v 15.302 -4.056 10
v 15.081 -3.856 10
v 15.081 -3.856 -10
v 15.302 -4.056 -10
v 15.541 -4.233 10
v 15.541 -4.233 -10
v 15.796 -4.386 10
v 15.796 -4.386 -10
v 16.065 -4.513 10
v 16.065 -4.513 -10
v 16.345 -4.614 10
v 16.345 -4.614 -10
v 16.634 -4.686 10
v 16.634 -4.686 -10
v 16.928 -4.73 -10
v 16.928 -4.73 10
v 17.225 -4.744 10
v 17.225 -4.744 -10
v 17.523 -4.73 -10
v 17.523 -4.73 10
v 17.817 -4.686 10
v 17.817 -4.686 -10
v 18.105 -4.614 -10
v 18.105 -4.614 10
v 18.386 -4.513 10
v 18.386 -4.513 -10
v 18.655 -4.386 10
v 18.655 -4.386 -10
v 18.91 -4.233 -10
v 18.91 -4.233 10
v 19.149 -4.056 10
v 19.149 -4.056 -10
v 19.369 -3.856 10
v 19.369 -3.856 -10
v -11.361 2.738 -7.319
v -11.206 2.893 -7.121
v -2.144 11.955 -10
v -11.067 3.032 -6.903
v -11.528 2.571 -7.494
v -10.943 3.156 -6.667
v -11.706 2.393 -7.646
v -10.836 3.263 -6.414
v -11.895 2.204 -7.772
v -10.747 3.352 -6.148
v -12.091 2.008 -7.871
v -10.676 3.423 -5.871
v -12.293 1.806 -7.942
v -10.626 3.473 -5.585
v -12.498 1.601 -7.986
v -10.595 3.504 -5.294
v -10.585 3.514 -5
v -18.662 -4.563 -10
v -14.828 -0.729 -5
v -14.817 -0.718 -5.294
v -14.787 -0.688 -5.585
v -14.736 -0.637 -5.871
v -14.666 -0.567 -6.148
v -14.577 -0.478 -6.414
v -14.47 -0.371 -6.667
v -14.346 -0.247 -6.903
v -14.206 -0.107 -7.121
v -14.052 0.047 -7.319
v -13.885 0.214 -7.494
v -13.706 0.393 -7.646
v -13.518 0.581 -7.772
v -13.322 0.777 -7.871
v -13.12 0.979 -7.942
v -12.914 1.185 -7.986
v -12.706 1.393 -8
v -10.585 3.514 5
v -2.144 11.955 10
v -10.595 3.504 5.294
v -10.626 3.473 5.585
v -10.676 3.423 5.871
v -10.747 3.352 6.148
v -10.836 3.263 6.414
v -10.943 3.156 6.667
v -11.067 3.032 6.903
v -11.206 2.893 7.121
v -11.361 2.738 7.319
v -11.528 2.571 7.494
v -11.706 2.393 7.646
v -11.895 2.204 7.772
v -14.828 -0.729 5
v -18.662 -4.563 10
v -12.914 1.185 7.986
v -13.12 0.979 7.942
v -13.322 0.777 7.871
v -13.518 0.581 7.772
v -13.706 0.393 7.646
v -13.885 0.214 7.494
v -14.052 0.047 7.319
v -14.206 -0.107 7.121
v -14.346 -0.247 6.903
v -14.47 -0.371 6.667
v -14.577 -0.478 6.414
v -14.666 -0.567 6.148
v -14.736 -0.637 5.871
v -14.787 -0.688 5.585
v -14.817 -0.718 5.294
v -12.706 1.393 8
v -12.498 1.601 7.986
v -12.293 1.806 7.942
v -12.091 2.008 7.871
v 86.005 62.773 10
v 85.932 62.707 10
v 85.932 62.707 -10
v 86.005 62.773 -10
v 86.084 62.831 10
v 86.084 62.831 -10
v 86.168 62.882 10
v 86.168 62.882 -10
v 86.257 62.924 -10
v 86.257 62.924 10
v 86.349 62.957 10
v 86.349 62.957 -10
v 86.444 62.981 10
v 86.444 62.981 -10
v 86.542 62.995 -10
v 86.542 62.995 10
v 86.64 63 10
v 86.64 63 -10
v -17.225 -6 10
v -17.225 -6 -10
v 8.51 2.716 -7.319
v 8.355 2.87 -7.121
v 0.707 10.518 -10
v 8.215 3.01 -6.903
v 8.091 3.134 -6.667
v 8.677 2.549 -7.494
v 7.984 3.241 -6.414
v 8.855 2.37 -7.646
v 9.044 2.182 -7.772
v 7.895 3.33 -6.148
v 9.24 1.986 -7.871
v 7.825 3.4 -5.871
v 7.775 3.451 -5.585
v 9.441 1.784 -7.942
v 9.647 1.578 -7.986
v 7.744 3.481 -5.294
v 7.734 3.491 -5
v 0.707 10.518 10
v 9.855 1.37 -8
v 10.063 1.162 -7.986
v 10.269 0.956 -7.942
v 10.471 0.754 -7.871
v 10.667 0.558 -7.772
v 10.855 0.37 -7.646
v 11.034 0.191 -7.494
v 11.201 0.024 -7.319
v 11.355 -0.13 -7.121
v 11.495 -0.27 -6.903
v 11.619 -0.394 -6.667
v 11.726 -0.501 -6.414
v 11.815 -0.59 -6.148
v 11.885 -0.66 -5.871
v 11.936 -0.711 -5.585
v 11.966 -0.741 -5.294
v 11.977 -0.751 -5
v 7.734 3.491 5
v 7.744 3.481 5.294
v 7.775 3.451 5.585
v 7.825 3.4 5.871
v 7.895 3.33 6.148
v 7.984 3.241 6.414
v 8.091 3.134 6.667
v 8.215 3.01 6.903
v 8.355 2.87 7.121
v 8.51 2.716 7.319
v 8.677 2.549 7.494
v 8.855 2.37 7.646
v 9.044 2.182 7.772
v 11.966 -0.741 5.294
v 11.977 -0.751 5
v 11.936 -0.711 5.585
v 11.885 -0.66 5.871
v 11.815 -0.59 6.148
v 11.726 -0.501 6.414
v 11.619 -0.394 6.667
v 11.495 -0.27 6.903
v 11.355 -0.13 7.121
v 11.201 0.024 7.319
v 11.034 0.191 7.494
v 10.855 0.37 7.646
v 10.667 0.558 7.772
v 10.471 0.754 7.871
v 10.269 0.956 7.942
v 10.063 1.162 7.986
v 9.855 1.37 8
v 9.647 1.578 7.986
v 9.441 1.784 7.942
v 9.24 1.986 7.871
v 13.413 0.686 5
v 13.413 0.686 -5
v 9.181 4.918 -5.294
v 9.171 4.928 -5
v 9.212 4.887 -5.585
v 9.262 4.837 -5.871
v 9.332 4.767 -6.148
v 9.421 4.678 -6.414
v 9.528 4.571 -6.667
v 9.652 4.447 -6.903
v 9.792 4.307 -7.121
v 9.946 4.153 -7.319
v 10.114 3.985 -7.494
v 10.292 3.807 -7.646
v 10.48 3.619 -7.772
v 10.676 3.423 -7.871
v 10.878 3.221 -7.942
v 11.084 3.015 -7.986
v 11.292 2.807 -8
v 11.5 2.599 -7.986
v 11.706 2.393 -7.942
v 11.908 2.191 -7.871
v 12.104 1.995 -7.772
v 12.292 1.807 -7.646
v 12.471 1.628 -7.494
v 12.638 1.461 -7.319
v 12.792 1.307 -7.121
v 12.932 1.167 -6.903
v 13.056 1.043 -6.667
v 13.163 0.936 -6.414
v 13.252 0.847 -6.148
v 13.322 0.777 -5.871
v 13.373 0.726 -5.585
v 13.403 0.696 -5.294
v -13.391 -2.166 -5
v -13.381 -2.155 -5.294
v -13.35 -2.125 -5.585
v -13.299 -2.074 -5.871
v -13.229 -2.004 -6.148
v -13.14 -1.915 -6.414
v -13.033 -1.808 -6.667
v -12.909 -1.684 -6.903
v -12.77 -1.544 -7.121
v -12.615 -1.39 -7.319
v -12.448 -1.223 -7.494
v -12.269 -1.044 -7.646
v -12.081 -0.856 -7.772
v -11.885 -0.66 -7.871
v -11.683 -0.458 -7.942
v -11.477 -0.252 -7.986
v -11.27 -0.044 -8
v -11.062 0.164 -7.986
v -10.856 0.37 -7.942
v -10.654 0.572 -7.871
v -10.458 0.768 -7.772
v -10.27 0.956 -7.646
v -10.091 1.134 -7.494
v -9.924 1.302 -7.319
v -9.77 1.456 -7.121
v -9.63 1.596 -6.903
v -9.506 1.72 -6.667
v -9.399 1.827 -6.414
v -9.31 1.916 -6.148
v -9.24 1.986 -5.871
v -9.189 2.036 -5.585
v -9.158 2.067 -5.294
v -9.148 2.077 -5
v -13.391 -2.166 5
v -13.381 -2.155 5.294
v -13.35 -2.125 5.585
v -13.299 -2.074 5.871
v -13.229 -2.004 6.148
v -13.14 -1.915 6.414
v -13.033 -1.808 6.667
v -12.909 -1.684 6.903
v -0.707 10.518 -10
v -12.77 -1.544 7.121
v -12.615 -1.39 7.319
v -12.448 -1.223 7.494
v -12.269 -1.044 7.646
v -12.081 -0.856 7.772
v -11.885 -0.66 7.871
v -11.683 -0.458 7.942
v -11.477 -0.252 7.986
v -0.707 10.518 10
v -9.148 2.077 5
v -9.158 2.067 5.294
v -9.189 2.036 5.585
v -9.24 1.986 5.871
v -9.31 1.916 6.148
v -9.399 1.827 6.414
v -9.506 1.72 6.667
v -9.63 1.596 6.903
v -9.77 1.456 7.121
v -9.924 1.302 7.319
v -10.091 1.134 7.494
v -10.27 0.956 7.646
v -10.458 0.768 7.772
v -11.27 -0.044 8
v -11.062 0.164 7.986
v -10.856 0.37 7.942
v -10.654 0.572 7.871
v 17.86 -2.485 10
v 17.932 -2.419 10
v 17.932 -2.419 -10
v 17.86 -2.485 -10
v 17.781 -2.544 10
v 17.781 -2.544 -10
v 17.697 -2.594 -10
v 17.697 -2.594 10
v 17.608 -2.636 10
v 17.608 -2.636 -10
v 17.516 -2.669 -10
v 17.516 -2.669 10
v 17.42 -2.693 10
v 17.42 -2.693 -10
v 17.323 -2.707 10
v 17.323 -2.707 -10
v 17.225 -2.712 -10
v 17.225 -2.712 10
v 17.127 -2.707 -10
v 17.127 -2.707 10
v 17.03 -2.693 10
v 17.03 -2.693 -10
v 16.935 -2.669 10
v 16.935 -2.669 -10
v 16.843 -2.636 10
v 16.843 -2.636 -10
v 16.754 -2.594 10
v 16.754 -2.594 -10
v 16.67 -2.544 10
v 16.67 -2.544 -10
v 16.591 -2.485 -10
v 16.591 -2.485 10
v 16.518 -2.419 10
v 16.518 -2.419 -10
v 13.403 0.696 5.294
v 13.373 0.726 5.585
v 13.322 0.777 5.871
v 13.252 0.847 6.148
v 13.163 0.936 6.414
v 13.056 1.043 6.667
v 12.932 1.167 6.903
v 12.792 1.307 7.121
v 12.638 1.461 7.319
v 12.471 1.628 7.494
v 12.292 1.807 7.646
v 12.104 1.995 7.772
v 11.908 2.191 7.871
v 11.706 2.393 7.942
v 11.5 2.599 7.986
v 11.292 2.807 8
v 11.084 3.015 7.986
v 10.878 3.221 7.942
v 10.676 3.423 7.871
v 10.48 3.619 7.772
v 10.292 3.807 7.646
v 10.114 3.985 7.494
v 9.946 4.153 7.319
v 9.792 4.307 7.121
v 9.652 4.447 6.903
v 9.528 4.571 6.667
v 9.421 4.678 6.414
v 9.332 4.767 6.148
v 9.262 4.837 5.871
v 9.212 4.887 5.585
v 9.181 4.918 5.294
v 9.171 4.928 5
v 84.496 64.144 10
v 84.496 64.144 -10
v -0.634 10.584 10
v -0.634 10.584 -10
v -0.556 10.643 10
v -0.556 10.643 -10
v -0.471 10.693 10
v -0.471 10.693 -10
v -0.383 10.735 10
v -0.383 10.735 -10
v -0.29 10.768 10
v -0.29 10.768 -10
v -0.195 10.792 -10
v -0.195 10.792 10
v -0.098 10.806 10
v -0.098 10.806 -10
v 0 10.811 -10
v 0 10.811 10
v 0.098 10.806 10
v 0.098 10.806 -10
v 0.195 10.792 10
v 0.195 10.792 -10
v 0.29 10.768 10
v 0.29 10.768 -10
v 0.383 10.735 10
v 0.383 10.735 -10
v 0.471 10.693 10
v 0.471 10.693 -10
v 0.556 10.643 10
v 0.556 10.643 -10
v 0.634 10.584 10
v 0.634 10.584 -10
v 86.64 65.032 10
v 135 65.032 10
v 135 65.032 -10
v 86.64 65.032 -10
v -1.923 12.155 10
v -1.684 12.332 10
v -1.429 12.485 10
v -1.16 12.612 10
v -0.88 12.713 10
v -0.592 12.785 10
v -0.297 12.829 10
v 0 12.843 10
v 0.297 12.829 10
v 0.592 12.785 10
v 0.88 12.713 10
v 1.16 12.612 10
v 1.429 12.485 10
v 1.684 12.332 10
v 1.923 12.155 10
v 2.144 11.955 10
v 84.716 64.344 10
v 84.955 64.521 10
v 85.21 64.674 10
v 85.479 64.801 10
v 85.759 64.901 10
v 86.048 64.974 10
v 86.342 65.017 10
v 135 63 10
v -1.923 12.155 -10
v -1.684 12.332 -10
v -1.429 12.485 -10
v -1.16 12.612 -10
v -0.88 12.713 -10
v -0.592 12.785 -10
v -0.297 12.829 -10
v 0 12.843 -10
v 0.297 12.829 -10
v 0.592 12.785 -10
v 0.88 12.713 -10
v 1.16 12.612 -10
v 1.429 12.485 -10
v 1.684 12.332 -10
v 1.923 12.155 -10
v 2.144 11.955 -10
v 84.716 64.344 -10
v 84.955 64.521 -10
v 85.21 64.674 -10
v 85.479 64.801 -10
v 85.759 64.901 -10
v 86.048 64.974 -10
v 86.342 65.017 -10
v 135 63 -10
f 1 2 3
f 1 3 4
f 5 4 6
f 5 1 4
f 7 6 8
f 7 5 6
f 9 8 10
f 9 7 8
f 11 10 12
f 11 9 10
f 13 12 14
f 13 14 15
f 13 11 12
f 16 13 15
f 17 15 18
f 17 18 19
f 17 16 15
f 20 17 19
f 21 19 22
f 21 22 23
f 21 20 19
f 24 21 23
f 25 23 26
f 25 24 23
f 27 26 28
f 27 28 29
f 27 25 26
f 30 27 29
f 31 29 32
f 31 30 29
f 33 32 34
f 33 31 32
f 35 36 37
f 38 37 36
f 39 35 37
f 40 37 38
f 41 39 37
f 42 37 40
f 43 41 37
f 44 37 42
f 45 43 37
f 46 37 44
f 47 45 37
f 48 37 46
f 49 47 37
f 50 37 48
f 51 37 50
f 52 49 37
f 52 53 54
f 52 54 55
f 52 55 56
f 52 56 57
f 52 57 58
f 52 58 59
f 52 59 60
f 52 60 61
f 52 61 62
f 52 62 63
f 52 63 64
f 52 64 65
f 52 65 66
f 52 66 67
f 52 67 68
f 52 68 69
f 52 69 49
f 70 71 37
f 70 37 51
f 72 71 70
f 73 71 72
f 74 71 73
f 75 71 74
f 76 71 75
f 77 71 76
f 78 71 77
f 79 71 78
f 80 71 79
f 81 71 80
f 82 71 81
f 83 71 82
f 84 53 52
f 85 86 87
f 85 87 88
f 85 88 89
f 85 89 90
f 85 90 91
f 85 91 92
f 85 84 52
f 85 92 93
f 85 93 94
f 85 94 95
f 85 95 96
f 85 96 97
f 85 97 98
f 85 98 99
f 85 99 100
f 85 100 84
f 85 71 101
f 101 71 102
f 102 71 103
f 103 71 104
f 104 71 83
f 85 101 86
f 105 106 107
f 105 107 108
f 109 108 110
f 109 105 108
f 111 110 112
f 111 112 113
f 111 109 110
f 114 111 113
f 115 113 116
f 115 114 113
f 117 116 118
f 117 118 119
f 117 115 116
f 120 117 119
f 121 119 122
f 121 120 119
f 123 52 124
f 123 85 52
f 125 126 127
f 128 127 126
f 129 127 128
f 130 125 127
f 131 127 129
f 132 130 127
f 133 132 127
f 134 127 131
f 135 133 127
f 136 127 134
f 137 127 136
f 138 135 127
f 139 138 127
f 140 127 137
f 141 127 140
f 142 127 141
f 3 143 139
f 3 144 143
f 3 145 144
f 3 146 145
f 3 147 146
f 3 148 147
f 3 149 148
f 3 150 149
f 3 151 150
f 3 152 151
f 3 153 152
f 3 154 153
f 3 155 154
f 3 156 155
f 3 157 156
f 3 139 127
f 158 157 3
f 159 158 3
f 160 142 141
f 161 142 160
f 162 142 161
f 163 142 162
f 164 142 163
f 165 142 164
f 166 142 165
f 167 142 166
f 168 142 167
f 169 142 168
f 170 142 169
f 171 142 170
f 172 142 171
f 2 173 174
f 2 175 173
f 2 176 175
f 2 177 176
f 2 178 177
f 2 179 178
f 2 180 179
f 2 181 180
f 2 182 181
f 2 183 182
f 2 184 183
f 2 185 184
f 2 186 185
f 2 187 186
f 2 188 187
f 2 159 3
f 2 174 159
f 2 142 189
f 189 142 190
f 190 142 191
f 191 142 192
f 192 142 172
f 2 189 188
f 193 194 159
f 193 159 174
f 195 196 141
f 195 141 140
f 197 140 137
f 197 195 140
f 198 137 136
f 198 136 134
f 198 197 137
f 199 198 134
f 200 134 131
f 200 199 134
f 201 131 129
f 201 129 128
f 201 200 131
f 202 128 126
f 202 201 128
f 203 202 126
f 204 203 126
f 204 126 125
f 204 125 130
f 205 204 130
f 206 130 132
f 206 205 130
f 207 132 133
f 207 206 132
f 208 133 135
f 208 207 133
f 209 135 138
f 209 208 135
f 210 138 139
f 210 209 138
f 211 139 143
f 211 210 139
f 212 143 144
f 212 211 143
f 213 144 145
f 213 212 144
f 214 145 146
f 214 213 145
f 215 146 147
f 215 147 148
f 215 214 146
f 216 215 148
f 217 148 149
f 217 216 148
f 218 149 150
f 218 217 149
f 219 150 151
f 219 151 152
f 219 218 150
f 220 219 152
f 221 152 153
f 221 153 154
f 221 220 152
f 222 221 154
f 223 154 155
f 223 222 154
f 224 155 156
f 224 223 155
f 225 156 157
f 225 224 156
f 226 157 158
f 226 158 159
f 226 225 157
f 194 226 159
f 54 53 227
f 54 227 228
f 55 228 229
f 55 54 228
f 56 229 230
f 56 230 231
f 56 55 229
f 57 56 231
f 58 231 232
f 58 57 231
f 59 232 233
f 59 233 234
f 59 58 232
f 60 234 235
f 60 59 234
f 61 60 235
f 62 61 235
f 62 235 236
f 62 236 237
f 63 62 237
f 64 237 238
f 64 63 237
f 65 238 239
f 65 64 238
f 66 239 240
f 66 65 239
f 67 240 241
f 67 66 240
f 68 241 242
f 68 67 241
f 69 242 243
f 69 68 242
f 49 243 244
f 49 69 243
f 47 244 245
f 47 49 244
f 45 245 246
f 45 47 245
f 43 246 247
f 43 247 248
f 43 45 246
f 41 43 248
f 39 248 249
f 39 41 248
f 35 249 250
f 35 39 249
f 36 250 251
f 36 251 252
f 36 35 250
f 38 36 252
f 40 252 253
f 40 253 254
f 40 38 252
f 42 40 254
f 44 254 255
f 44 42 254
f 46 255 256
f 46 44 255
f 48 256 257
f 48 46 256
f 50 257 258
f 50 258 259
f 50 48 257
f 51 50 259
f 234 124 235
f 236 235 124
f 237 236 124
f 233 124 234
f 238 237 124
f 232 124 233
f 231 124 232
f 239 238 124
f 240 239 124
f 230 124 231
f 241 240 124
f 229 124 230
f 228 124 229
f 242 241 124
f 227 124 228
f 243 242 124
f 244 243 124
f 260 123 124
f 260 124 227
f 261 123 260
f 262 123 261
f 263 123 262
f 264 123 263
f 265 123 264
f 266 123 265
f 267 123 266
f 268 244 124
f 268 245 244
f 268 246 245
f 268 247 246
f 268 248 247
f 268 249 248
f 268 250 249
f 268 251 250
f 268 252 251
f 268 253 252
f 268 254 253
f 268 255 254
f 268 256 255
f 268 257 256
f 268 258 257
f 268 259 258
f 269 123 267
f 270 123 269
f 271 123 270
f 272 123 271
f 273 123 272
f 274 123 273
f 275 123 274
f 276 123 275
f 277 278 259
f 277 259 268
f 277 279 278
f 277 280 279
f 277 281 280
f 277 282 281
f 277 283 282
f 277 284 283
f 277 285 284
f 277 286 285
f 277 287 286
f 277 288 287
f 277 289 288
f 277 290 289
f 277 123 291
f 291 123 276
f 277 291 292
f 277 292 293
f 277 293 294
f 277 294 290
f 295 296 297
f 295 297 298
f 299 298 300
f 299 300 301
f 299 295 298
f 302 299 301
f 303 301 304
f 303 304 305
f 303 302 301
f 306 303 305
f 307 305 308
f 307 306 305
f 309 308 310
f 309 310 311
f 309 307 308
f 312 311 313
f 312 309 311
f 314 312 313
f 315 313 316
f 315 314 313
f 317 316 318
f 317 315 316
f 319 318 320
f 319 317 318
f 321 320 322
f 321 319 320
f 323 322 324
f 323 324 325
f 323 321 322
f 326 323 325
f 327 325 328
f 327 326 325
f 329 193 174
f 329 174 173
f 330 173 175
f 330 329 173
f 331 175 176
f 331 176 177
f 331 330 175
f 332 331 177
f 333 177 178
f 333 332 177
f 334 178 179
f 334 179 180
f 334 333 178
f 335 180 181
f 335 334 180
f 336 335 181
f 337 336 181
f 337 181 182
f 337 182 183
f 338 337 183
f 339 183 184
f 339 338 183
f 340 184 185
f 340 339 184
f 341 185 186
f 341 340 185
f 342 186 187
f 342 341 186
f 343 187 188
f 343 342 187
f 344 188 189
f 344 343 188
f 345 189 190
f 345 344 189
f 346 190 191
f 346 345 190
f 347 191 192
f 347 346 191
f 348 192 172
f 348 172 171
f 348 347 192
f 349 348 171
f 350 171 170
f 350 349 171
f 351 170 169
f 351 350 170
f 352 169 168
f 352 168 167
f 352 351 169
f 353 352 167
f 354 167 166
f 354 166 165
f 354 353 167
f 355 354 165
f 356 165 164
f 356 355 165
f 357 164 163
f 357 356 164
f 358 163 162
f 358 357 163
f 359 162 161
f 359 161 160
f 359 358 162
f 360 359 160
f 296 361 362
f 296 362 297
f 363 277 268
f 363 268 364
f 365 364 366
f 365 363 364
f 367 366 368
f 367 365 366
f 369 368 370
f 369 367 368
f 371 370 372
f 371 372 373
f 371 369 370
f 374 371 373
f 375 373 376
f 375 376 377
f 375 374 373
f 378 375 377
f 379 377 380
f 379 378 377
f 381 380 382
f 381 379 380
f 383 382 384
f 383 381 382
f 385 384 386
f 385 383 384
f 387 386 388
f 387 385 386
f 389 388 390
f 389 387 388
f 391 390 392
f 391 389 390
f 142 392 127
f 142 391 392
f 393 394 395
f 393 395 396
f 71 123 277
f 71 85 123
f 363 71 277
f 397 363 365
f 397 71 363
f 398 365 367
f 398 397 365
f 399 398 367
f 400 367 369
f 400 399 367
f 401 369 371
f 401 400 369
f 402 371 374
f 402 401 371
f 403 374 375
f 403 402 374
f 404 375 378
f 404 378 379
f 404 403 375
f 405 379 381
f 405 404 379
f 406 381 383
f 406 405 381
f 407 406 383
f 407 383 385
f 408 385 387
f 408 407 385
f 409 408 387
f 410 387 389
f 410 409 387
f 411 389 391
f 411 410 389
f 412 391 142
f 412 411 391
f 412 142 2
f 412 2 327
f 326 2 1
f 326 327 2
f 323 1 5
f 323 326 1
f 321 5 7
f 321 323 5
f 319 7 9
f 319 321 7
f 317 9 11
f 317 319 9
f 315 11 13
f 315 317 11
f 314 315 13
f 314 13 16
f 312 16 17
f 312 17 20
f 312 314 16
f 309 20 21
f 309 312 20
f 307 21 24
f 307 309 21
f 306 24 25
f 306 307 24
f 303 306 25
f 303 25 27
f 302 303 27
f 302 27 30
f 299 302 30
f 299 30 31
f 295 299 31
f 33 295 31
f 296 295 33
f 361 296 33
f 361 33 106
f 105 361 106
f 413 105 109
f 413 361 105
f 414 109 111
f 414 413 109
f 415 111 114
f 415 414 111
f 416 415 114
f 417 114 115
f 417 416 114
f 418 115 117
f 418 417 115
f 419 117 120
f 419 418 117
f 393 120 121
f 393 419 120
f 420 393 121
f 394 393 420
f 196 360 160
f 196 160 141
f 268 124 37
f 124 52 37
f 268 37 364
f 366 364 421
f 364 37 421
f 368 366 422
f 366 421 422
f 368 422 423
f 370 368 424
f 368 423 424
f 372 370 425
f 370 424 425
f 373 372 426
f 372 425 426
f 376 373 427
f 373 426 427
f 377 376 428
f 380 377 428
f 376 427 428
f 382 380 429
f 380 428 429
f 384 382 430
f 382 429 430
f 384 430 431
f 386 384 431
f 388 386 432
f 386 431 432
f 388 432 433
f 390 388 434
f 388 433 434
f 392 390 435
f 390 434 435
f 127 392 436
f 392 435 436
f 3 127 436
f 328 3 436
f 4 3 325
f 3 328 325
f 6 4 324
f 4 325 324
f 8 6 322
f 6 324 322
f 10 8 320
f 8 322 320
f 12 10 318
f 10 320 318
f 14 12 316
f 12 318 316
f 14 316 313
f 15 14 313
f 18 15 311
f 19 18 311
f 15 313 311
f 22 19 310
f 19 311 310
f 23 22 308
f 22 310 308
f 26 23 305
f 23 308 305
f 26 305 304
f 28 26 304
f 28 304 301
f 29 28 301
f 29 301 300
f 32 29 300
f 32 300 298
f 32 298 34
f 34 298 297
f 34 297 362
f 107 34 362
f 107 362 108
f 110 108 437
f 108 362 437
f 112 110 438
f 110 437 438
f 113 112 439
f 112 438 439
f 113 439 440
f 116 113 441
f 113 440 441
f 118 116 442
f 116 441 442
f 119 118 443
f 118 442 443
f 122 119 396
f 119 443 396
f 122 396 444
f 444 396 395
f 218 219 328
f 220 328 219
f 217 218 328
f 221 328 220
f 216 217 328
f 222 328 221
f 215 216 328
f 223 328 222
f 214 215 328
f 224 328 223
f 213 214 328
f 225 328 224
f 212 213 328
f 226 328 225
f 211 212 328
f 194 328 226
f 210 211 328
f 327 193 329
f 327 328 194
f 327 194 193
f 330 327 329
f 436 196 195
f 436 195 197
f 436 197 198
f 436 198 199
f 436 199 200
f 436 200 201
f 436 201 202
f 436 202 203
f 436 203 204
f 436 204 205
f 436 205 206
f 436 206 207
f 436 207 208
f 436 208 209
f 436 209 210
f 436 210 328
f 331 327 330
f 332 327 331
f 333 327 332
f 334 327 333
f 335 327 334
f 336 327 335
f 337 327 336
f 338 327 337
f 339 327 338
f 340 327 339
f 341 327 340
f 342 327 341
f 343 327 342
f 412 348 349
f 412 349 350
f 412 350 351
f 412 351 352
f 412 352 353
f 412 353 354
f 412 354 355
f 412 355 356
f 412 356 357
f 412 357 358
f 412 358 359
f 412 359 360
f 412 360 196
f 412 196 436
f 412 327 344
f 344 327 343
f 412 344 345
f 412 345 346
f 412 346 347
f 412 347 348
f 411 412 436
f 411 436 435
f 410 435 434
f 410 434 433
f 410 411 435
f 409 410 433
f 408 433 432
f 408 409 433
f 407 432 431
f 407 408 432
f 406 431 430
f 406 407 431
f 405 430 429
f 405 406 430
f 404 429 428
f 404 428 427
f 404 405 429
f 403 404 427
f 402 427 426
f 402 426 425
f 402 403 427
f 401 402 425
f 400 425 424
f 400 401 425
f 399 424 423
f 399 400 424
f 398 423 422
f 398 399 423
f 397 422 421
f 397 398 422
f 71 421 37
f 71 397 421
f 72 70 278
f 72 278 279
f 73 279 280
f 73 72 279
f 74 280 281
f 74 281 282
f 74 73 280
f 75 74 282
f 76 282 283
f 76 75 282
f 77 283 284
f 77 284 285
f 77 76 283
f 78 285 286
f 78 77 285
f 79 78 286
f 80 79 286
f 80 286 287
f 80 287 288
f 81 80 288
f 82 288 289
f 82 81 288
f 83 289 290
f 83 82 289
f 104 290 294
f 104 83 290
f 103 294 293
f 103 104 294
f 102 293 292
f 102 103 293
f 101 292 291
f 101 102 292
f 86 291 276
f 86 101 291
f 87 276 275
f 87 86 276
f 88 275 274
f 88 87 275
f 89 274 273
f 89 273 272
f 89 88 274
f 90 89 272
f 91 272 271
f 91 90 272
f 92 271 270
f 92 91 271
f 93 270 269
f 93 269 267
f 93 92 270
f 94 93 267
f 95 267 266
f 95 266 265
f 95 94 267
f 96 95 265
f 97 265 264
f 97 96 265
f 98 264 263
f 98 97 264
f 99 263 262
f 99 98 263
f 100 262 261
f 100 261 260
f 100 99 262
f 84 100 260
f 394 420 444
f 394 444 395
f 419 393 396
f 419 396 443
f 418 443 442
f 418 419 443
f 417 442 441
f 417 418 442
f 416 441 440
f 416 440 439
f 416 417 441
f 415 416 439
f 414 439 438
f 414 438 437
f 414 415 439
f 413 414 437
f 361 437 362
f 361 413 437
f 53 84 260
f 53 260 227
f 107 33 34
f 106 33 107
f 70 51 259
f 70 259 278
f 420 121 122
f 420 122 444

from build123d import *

# Parameters (mm, degrees)
BASE_FLANGE1_DEPTH = 10
CUT_EXTRUDE1_DEPTH = 2.032
CUT_EXTRUDE2_DEPTH = 2.032


# Sheet-metal steps are written as plain solids
with BuildPart() as part:
    # Sketch1 → Base-Flange1 (new, symmetric)
    with BuildSketch(Plane.XY):
        with BuildLine():
            Line((-17.225320151, -6), (-0.707106781, 10.51821337))
            ThreePointArc((-0.707106781, 10.51821337), (0, 10.811106589), (0.707106781, 10.51821337))
            Line((0.707106781, 10.51821337), (15.081372391, -3.856052239))
            ThreePointArc((15.081372391, -3.856052239), (17.225320151, -4.744104479), (19.369267912, -3.856052239))
            Line((19.369267912, -3.856052239), (85.932426933, 62.707106781))
            ThreePointArc((85.932426933, 62.707106781), (86.256850281, 62.923879533), (86.639533714, 63))
            Line((86.639533714, 63), (135, 63))
            Line((135, 63), (135, 65.032))
            Line((135, 65.032), (86.639533714, 65.032))
            ThreePointArc((86.639533714, 65.032), (85.479237547, 64.801202743), (84.495585953, 64.143947761))
            Line((84.495585953, 64.143947761), (17.932426933, -2.41921126))
            ThreePointArc((17.932426933, -2.41921126), (17.225320151, -2.712104479), (16.51821337, -2.41921126))
            Line((16.51821337, -2.41921126), (2.143947761, 11.95505435))
            ThreePointArc((2.143947761, 11.95505435), (0, 12.843106589), (-2.143947761, 11.95505435))
            Line((-2.143947761, 11.95505435), (-18.662161131, -4.563159021))
            Line((-18.662161131, -4.563159021), (-17.225320151, -6))
        make_face()
    extrude(amount=BASE_FLANGE1_DEPTH, both=True)

    # Sketch6 → Cut-Extrude1 (cut)
    with BuildSketch(Plane(origin=(-7.049501055, 7.049501055, 0), x_dir=(0, 0, 1), z_dir=(-0.7071067811865488, 0.7071067811865464, 0))):
        with BuildLine():
            Line((-5, -5), (5, -5))
            ThreePointArc((5, -5), (8, -8), (5, -11))
            Line((5, -11), (-5, -11))
            ThreePointArc((-5, -11), (-8, -8), (-5, -5))
        make_face()
    extrude(amount=-CUT_EXTRUDE1_DEPTH, mode=Mode.SUBTRACT)

    # Sketch9 → Cut-Extrude2 (cut)
    with BuildSketch(Plane(origin=(7.049501055, 7.049501055, 0), x_dir=(0, 0, -1), z_dir=(0.7071067811865488, 0.7071067811865464, 0))):
        with BuildLine():
            Line((-5, -3), (5, -3))
            ThreePointArc((5, -3), (8, -6), (5, -9))
            Line((5, -9), (-5, -9))
            ThreePointArc((-5, -9), (-8, -6), (-5, -3))
        make_face()
    extrude(amount=-CUT_EXTRUDE2_DEPTH, mode=Mode.SUBTRACT)


solid = part.part
